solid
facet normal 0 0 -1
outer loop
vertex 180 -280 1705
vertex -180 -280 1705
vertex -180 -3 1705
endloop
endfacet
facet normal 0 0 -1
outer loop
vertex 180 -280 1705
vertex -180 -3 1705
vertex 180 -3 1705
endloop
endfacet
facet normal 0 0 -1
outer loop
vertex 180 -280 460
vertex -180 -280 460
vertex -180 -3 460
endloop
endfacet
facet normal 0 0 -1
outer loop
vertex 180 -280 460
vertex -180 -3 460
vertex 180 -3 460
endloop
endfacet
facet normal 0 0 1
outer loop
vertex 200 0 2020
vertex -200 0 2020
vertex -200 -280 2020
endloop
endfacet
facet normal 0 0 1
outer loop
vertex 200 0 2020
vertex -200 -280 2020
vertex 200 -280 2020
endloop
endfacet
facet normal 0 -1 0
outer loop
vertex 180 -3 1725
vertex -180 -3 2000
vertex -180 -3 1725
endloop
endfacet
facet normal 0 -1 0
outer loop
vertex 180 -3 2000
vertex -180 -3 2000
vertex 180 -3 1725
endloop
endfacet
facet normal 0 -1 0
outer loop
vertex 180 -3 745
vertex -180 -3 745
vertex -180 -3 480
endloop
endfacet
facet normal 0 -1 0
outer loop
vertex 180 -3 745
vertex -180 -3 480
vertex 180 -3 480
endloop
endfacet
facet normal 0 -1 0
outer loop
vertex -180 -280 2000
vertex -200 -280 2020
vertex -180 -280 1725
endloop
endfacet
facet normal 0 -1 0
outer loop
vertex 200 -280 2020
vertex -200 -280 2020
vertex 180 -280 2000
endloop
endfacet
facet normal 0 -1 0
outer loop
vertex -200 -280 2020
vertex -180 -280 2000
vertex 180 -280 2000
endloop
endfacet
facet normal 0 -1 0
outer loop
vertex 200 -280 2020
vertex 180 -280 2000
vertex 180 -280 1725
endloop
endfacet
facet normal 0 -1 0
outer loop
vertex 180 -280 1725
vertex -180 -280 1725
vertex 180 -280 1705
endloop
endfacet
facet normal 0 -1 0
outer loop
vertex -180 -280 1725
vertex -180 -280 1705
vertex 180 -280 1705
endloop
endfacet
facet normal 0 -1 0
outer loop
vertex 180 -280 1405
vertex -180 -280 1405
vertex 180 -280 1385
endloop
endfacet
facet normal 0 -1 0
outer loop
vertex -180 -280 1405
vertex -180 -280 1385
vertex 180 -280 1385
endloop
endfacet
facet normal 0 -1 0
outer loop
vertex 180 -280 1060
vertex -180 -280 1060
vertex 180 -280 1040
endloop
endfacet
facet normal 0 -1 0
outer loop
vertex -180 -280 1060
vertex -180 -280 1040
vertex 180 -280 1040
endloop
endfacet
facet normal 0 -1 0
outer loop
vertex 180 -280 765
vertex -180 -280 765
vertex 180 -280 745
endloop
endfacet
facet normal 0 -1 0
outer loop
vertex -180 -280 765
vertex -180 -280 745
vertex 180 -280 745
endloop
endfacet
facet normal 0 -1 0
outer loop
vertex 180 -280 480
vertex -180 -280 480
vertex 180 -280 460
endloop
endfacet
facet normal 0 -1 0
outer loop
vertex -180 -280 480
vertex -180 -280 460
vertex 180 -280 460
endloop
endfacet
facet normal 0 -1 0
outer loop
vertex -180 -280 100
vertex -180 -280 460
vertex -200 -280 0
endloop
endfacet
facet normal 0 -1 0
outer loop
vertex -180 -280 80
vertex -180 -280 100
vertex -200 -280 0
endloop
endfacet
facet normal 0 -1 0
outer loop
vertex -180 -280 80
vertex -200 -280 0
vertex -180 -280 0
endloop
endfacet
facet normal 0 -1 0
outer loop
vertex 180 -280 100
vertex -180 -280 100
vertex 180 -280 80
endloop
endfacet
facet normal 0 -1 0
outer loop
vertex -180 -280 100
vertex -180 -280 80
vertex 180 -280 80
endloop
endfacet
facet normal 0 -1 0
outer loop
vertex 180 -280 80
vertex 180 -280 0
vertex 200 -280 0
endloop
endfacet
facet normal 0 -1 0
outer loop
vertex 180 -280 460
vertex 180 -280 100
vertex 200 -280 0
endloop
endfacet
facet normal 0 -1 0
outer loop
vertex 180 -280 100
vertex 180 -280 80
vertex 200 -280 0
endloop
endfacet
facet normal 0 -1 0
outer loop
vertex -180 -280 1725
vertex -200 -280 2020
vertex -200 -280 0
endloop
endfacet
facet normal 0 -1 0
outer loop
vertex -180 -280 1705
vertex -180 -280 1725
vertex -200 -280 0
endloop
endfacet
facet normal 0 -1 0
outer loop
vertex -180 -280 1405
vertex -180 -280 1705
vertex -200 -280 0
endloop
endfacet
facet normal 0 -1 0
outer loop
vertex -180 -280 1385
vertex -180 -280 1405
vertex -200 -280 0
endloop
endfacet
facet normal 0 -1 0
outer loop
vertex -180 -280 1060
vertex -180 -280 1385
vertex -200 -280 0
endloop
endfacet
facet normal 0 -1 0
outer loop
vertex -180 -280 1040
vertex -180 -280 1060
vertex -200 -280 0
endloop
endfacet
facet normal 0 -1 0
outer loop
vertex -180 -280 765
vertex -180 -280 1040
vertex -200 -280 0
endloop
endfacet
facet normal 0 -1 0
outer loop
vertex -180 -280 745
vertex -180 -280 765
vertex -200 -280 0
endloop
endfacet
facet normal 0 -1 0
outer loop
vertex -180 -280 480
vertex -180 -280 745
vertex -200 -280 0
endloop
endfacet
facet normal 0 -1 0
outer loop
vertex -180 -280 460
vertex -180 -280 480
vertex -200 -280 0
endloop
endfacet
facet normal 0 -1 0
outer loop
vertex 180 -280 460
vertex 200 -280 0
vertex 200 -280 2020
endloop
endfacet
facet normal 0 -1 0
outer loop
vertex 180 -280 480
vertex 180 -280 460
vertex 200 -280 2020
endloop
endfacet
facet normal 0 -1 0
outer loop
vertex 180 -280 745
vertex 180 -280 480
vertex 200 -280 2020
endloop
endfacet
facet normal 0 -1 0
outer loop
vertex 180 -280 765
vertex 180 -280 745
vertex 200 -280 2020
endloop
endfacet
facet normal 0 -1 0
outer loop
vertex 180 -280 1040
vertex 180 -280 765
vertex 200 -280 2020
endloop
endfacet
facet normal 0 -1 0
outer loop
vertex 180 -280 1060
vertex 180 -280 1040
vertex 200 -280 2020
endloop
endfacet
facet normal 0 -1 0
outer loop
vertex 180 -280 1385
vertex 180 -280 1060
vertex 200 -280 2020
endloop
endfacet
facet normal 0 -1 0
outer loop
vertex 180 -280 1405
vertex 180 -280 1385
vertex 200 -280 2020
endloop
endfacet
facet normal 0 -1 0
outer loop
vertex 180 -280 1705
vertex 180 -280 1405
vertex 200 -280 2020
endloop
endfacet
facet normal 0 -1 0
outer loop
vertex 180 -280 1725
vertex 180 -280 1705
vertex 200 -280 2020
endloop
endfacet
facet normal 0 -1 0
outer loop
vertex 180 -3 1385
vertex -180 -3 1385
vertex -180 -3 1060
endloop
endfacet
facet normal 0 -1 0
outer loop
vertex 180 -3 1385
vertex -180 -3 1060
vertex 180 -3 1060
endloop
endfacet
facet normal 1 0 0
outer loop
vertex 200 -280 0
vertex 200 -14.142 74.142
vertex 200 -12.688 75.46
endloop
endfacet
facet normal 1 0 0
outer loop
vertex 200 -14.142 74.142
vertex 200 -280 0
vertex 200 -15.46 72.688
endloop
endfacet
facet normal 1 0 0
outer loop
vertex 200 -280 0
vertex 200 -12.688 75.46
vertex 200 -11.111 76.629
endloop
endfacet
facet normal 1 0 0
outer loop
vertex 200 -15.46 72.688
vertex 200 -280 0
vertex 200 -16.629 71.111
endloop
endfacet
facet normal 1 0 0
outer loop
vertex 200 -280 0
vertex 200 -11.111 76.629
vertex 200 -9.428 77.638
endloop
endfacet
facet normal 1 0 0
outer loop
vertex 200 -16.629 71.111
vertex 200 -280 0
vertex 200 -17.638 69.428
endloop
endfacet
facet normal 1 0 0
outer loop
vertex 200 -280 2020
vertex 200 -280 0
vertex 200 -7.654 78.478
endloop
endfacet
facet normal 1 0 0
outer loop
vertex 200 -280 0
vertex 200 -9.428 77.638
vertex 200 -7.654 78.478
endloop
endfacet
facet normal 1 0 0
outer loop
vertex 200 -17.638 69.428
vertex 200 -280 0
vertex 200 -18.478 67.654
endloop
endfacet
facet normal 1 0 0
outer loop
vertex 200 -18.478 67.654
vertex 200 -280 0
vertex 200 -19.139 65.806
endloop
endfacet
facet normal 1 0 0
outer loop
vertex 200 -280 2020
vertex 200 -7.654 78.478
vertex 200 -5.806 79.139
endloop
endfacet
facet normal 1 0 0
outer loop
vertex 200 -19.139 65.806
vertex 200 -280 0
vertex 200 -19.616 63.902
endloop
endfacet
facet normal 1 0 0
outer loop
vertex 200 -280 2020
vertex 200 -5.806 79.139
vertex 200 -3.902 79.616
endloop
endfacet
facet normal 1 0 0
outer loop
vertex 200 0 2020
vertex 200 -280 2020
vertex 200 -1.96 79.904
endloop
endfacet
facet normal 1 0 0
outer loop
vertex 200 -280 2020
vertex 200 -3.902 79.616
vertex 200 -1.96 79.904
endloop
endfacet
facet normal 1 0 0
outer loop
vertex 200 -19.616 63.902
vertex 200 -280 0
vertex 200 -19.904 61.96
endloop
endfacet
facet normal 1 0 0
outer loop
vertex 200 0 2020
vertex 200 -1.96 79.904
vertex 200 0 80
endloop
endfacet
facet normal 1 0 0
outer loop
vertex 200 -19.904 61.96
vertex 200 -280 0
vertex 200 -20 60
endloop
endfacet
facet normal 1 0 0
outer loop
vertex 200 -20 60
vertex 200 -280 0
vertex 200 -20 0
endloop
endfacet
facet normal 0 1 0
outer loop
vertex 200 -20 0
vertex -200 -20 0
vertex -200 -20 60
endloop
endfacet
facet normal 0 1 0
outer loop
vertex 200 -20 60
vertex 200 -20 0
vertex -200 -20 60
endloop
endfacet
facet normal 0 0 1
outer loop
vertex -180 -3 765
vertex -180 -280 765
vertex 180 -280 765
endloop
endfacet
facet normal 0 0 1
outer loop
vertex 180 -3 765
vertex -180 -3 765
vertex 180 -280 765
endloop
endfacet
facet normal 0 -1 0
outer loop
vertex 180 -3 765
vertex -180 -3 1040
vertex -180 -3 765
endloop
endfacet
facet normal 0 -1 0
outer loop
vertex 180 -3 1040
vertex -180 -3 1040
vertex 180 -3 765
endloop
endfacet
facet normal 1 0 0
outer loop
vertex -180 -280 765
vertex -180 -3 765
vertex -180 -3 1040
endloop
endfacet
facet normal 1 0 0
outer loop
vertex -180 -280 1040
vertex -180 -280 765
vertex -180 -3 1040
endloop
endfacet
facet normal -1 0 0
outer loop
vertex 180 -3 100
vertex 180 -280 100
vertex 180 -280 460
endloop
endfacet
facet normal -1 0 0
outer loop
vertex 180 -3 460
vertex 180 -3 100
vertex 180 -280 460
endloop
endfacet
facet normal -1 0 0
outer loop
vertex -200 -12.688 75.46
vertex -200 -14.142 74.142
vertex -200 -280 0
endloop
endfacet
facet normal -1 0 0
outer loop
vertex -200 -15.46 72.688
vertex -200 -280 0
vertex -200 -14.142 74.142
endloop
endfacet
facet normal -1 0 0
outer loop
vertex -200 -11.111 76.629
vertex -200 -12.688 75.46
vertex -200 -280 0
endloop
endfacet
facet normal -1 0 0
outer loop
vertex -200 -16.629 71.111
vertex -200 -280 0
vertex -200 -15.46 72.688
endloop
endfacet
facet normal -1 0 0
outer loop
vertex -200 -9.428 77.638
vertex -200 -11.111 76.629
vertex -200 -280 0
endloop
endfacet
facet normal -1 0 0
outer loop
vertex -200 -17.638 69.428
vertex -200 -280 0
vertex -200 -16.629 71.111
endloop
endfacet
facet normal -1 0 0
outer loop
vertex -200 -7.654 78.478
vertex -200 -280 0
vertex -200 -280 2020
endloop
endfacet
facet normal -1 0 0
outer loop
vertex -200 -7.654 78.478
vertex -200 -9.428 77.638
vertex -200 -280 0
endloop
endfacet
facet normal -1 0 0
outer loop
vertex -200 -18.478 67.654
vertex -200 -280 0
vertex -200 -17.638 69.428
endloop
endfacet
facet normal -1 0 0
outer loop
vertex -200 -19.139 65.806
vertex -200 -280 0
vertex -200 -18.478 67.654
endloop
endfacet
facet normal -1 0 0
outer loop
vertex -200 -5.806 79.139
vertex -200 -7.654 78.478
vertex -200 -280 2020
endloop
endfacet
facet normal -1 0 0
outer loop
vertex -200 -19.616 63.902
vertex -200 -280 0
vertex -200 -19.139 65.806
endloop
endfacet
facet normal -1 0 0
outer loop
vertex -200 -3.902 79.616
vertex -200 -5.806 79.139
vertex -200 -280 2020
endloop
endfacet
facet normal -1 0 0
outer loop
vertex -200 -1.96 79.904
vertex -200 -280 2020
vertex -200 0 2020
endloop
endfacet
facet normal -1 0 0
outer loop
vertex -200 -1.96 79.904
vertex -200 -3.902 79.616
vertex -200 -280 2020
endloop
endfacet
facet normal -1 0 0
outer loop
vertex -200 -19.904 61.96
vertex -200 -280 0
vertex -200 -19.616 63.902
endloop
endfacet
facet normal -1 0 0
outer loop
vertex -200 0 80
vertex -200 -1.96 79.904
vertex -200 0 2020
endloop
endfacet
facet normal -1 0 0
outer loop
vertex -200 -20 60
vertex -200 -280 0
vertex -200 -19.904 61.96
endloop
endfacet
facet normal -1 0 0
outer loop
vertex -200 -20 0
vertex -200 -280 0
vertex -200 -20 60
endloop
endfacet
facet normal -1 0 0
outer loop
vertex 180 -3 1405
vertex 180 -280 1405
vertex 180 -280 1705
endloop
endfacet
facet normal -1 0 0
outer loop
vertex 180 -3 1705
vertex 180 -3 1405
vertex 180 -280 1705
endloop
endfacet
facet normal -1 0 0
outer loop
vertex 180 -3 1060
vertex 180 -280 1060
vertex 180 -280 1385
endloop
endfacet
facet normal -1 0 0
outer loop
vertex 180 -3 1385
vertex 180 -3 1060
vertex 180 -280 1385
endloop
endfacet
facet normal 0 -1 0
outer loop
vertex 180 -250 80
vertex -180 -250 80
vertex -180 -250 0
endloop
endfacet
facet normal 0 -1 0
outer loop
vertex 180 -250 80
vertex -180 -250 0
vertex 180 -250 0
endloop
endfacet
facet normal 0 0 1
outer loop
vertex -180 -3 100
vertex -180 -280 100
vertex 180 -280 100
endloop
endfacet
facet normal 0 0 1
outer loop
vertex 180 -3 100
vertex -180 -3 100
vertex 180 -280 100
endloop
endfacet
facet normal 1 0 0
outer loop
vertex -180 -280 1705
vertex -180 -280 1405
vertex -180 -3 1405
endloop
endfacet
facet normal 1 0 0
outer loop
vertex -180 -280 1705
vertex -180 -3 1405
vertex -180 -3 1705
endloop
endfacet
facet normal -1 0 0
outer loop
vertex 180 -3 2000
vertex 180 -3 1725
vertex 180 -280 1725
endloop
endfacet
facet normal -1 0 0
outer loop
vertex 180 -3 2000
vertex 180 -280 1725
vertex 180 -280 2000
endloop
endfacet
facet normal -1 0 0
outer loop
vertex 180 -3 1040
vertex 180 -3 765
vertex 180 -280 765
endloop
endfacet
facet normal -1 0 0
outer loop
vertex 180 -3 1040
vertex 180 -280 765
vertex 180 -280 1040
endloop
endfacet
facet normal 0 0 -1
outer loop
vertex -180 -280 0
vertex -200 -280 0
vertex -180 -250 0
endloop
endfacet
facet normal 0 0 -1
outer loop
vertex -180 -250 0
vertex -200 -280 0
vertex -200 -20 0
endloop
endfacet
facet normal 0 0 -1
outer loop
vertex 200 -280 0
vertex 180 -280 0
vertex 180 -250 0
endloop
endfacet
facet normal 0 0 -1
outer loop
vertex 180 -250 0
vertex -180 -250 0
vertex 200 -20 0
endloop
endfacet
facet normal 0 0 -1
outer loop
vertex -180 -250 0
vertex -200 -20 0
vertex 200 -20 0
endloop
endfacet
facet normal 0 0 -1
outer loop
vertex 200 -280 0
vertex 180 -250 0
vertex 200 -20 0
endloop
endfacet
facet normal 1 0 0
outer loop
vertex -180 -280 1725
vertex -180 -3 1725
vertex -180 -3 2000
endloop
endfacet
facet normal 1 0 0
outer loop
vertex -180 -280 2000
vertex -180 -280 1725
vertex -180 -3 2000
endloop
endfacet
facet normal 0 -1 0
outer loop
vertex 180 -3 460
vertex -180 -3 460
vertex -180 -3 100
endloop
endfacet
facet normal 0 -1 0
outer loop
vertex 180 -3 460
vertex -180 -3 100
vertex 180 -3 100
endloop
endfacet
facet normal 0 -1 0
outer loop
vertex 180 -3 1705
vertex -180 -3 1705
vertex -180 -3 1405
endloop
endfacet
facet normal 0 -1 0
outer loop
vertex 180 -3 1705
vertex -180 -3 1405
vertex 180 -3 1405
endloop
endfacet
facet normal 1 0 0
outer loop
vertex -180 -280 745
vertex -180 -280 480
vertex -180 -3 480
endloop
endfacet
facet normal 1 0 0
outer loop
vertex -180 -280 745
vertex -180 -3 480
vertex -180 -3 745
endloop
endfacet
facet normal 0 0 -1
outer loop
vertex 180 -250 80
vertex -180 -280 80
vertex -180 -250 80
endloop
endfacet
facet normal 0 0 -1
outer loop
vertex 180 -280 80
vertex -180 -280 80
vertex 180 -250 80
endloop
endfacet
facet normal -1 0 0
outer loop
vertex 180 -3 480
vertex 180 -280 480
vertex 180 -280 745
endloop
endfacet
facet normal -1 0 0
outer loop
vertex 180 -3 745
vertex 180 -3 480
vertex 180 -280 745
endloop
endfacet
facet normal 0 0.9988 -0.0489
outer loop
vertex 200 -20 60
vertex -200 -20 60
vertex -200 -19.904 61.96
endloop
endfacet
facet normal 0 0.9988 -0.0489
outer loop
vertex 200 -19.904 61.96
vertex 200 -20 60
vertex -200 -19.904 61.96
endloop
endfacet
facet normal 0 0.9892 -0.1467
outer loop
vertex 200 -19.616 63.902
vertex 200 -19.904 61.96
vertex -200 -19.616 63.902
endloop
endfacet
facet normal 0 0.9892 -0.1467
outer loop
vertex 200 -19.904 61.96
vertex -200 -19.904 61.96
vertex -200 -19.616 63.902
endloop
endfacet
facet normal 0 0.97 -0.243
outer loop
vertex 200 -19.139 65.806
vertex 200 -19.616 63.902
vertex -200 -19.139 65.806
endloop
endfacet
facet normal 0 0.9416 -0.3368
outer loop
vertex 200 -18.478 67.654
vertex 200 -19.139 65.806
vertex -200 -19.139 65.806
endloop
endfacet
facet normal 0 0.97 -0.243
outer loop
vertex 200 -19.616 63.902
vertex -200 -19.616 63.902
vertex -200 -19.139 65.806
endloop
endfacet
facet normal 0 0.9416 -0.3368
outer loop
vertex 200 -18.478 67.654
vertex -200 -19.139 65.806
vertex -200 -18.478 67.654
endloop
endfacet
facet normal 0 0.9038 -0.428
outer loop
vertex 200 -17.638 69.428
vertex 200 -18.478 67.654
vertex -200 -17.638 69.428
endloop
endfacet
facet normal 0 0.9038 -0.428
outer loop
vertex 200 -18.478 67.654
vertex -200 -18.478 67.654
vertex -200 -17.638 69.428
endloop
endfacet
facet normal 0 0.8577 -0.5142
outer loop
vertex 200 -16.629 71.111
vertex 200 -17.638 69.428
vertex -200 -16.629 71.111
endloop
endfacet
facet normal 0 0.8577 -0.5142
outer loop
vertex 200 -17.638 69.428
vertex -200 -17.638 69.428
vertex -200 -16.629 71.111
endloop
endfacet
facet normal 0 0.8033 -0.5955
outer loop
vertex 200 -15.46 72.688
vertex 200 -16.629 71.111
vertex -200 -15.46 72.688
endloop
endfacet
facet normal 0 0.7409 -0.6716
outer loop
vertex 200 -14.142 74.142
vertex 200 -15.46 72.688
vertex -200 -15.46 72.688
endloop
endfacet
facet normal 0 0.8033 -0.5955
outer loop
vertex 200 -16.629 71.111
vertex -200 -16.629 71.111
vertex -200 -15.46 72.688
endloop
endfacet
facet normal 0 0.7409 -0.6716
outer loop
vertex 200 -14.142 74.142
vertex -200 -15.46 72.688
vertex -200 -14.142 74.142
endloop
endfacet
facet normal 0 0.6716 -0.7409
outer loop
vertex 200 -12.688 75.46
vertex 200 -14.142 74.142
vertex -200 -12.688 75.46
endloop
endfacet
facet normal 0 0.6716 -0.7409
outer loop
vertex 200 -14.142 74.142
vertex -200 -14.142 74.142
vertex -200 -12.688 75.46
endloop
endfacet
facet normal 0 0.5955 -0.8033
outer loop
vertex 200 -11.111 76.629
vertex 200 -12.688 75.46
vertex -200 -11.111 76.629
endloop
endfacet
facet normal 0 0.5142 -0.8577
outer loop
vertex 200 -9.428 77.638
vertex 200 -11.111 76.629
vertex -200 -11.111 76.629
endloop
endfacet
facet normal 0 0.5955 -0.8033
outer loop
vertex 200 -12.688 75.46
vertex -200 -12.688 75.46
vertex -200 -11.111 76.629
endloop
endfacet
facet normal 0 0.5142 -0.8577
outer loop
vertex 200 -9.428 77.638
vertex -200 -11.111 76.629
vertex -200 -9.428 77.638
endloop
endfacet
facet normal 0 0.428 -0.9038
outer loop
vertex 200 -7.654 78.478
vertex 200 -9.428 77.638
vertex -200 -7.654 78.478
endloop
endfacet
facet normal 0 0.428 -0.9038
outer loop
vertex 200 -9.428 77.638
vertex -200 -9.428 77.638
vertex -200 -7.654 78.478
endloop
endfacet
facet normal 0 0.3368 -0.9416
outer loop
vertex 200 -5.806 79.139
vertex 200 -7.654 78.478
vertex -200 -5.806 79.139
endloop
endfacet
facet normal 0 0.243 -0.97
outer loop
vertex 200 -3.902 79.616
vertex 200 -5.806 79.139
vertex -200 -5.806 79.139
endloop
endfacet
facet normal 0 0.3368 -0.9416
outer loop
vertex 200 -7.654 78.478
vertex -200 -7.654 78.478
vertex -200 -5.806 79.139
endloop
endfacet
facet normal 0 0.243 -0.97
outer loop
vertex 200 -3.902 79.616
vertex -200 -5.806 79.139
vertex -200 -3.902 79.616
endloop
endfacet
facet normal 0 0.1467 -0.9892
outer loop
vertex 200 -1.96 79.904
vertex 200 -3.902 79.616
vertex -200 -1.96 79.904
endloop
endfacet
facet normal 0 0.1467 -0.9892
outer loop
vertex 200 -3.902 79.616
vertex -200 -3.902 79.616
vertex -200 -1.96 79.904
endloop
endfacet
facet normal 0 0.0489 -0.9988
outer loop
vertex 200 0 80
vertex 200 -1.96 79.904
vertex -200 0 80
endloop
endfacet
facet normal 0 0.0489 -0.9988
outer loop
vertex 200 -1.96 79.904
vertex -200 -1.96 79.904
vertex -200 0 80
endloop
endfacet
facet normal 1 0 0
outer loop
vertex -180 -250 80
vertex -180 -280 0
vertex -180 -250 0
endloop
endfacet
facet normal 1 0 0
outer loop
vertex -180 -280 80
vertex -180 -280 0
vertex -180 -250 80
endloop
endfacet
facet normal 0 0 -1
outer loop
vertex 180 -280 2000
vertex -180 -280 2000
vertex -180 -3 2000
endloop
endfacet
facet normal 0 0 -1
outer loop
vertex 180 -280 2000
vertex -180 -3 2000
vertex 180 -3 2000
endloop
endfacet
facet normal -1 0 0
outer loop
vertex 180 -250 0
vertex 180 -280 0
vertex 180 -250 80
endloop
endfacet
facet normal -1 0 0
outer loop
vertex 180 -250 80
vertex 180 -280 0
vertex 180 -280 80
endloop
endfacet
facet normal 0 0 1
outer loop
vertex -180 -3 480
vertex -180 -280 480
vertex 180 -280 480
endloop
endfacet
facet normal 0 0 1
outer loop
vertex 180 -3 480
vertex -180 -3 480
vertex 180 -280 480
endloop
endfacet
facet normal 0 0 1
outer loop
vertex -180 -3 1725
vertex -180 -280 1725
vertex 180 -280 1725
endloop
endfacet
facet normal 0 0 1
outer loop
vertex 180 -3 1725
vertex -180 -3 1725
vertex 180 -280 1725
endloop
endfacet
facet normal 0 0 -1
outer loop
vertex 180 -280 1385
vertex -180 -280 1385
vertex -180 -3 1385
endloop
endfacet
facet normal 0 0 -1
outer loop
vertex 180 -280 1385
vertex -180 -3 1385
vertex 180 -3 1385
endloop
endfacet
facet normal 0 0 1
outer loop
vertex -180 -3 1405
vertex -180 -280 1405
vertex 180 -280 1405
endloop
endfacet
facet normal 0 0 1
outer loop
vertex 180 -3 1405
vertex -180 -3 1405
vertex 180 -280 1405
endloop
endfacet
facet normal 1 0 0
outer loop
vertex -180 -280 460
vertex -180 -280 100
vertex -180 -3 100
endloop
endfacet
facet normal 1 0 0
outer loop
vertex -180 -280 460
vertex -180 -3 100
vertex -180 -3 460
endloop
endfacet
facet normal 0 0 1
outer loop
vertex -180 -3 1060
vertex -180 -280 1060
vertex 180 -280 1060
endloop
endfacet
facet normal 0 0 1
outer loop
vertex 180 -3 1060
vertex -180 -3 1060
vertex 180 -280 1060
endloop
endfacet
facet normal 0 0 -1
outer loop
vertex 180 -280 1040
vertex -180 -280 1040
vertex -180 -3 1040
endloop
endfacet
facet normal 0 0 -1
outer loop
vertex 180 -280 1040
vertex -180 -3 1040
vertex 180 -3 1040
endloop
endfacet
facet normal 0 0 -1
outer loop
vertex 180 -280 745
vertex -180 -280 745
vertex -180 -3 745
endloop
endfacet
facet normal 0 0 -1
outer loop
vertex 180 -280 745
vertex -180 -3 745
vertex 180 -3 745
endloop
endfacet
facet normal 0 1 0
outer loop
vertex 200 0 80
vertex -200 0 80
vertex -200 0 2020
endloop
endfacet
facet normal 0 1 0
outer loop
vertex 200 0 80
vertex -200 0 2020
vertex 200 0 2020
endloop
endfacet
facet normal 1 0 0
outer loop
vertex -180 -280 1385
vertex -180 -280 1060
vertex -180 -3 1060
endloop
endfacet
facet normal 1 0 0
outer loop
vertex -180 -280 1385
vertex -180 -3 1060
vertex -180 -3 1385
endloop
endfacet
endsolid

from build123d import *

# Parameters (mm, degrees)
F0_W     = 400
F0_H     = 280
F1_DEPTH = 2020
F3_W     = 360
F3_H     = 275
F3_H_2   = 300
F3_H_3   = 325
F3_H_4   = 265
F3_H_5   = 360
F4_DEPTH = 277
F6_DEPTH = 400.001
F7_W     = 360
F7_H     = 80
F8_DEPTH = 30


with BuildPart() as f1:
    # F0 (on Top) → F1 (new body)
    with BuildSketch(Plane.XY):
        with Locations((0, -140)):
            Rectangle(F0_W, F0_H)
    extrude(amount=F1_DEPTH)

    # F3 (on face) → F4 (cut, through all)
    with BuildSketch(Plane.XZ.offset(280)):
        with Locations((0, 1862.5)):
            Rectangle(F3_W, F3_H)
        with Locations((0, 1555)):
            Rectangle(F3_W, F3_H_2)
        with Locations((0, 1222.5)):
            Rectangle(F3_W, F3_H_3)
        with Locations((0, 902.5)):
            Rectangle(F3_W, F3_H)
        with Locations((0, 612.5)):
            Rectangle(F3_W, F3_H_4)
        with Locations((0, 280)):
            Rectangle(F3_W, F3_H_5)
    extrude(amount=-F4_DEPTH, mode=Mode.SUBTRACT)

    # F5 (on face) → F6 (cut, through all)
    with BuildSketch(Plane(origin=(-200, 0, 0), x_dir=(0, -1, 0), z_dir=(-1, 0, 0))):
        with BuildLine():
            Line((0, 80), (0, 0))
            Line((0, 0), (20, 0))
            Line((20, 0), (20, 60))
            ThreePointArc((20, 60), (14.142136, 74.142136), (0, 80))
        make_face()
    extrude(amount=-F6_DEPTH, mode=Mode.SUBTRACT)

    # F7 (on face) → F8 (cut)
    with BuildSketch(Plane.XZ.offset(280)):
        with Locations((0, 40)):
            Rectangle(F7_W, F7_H)
    extrude(amount=-F8_DEPTH, mode=Mode.SUBTRACT)


solid = f1.part
